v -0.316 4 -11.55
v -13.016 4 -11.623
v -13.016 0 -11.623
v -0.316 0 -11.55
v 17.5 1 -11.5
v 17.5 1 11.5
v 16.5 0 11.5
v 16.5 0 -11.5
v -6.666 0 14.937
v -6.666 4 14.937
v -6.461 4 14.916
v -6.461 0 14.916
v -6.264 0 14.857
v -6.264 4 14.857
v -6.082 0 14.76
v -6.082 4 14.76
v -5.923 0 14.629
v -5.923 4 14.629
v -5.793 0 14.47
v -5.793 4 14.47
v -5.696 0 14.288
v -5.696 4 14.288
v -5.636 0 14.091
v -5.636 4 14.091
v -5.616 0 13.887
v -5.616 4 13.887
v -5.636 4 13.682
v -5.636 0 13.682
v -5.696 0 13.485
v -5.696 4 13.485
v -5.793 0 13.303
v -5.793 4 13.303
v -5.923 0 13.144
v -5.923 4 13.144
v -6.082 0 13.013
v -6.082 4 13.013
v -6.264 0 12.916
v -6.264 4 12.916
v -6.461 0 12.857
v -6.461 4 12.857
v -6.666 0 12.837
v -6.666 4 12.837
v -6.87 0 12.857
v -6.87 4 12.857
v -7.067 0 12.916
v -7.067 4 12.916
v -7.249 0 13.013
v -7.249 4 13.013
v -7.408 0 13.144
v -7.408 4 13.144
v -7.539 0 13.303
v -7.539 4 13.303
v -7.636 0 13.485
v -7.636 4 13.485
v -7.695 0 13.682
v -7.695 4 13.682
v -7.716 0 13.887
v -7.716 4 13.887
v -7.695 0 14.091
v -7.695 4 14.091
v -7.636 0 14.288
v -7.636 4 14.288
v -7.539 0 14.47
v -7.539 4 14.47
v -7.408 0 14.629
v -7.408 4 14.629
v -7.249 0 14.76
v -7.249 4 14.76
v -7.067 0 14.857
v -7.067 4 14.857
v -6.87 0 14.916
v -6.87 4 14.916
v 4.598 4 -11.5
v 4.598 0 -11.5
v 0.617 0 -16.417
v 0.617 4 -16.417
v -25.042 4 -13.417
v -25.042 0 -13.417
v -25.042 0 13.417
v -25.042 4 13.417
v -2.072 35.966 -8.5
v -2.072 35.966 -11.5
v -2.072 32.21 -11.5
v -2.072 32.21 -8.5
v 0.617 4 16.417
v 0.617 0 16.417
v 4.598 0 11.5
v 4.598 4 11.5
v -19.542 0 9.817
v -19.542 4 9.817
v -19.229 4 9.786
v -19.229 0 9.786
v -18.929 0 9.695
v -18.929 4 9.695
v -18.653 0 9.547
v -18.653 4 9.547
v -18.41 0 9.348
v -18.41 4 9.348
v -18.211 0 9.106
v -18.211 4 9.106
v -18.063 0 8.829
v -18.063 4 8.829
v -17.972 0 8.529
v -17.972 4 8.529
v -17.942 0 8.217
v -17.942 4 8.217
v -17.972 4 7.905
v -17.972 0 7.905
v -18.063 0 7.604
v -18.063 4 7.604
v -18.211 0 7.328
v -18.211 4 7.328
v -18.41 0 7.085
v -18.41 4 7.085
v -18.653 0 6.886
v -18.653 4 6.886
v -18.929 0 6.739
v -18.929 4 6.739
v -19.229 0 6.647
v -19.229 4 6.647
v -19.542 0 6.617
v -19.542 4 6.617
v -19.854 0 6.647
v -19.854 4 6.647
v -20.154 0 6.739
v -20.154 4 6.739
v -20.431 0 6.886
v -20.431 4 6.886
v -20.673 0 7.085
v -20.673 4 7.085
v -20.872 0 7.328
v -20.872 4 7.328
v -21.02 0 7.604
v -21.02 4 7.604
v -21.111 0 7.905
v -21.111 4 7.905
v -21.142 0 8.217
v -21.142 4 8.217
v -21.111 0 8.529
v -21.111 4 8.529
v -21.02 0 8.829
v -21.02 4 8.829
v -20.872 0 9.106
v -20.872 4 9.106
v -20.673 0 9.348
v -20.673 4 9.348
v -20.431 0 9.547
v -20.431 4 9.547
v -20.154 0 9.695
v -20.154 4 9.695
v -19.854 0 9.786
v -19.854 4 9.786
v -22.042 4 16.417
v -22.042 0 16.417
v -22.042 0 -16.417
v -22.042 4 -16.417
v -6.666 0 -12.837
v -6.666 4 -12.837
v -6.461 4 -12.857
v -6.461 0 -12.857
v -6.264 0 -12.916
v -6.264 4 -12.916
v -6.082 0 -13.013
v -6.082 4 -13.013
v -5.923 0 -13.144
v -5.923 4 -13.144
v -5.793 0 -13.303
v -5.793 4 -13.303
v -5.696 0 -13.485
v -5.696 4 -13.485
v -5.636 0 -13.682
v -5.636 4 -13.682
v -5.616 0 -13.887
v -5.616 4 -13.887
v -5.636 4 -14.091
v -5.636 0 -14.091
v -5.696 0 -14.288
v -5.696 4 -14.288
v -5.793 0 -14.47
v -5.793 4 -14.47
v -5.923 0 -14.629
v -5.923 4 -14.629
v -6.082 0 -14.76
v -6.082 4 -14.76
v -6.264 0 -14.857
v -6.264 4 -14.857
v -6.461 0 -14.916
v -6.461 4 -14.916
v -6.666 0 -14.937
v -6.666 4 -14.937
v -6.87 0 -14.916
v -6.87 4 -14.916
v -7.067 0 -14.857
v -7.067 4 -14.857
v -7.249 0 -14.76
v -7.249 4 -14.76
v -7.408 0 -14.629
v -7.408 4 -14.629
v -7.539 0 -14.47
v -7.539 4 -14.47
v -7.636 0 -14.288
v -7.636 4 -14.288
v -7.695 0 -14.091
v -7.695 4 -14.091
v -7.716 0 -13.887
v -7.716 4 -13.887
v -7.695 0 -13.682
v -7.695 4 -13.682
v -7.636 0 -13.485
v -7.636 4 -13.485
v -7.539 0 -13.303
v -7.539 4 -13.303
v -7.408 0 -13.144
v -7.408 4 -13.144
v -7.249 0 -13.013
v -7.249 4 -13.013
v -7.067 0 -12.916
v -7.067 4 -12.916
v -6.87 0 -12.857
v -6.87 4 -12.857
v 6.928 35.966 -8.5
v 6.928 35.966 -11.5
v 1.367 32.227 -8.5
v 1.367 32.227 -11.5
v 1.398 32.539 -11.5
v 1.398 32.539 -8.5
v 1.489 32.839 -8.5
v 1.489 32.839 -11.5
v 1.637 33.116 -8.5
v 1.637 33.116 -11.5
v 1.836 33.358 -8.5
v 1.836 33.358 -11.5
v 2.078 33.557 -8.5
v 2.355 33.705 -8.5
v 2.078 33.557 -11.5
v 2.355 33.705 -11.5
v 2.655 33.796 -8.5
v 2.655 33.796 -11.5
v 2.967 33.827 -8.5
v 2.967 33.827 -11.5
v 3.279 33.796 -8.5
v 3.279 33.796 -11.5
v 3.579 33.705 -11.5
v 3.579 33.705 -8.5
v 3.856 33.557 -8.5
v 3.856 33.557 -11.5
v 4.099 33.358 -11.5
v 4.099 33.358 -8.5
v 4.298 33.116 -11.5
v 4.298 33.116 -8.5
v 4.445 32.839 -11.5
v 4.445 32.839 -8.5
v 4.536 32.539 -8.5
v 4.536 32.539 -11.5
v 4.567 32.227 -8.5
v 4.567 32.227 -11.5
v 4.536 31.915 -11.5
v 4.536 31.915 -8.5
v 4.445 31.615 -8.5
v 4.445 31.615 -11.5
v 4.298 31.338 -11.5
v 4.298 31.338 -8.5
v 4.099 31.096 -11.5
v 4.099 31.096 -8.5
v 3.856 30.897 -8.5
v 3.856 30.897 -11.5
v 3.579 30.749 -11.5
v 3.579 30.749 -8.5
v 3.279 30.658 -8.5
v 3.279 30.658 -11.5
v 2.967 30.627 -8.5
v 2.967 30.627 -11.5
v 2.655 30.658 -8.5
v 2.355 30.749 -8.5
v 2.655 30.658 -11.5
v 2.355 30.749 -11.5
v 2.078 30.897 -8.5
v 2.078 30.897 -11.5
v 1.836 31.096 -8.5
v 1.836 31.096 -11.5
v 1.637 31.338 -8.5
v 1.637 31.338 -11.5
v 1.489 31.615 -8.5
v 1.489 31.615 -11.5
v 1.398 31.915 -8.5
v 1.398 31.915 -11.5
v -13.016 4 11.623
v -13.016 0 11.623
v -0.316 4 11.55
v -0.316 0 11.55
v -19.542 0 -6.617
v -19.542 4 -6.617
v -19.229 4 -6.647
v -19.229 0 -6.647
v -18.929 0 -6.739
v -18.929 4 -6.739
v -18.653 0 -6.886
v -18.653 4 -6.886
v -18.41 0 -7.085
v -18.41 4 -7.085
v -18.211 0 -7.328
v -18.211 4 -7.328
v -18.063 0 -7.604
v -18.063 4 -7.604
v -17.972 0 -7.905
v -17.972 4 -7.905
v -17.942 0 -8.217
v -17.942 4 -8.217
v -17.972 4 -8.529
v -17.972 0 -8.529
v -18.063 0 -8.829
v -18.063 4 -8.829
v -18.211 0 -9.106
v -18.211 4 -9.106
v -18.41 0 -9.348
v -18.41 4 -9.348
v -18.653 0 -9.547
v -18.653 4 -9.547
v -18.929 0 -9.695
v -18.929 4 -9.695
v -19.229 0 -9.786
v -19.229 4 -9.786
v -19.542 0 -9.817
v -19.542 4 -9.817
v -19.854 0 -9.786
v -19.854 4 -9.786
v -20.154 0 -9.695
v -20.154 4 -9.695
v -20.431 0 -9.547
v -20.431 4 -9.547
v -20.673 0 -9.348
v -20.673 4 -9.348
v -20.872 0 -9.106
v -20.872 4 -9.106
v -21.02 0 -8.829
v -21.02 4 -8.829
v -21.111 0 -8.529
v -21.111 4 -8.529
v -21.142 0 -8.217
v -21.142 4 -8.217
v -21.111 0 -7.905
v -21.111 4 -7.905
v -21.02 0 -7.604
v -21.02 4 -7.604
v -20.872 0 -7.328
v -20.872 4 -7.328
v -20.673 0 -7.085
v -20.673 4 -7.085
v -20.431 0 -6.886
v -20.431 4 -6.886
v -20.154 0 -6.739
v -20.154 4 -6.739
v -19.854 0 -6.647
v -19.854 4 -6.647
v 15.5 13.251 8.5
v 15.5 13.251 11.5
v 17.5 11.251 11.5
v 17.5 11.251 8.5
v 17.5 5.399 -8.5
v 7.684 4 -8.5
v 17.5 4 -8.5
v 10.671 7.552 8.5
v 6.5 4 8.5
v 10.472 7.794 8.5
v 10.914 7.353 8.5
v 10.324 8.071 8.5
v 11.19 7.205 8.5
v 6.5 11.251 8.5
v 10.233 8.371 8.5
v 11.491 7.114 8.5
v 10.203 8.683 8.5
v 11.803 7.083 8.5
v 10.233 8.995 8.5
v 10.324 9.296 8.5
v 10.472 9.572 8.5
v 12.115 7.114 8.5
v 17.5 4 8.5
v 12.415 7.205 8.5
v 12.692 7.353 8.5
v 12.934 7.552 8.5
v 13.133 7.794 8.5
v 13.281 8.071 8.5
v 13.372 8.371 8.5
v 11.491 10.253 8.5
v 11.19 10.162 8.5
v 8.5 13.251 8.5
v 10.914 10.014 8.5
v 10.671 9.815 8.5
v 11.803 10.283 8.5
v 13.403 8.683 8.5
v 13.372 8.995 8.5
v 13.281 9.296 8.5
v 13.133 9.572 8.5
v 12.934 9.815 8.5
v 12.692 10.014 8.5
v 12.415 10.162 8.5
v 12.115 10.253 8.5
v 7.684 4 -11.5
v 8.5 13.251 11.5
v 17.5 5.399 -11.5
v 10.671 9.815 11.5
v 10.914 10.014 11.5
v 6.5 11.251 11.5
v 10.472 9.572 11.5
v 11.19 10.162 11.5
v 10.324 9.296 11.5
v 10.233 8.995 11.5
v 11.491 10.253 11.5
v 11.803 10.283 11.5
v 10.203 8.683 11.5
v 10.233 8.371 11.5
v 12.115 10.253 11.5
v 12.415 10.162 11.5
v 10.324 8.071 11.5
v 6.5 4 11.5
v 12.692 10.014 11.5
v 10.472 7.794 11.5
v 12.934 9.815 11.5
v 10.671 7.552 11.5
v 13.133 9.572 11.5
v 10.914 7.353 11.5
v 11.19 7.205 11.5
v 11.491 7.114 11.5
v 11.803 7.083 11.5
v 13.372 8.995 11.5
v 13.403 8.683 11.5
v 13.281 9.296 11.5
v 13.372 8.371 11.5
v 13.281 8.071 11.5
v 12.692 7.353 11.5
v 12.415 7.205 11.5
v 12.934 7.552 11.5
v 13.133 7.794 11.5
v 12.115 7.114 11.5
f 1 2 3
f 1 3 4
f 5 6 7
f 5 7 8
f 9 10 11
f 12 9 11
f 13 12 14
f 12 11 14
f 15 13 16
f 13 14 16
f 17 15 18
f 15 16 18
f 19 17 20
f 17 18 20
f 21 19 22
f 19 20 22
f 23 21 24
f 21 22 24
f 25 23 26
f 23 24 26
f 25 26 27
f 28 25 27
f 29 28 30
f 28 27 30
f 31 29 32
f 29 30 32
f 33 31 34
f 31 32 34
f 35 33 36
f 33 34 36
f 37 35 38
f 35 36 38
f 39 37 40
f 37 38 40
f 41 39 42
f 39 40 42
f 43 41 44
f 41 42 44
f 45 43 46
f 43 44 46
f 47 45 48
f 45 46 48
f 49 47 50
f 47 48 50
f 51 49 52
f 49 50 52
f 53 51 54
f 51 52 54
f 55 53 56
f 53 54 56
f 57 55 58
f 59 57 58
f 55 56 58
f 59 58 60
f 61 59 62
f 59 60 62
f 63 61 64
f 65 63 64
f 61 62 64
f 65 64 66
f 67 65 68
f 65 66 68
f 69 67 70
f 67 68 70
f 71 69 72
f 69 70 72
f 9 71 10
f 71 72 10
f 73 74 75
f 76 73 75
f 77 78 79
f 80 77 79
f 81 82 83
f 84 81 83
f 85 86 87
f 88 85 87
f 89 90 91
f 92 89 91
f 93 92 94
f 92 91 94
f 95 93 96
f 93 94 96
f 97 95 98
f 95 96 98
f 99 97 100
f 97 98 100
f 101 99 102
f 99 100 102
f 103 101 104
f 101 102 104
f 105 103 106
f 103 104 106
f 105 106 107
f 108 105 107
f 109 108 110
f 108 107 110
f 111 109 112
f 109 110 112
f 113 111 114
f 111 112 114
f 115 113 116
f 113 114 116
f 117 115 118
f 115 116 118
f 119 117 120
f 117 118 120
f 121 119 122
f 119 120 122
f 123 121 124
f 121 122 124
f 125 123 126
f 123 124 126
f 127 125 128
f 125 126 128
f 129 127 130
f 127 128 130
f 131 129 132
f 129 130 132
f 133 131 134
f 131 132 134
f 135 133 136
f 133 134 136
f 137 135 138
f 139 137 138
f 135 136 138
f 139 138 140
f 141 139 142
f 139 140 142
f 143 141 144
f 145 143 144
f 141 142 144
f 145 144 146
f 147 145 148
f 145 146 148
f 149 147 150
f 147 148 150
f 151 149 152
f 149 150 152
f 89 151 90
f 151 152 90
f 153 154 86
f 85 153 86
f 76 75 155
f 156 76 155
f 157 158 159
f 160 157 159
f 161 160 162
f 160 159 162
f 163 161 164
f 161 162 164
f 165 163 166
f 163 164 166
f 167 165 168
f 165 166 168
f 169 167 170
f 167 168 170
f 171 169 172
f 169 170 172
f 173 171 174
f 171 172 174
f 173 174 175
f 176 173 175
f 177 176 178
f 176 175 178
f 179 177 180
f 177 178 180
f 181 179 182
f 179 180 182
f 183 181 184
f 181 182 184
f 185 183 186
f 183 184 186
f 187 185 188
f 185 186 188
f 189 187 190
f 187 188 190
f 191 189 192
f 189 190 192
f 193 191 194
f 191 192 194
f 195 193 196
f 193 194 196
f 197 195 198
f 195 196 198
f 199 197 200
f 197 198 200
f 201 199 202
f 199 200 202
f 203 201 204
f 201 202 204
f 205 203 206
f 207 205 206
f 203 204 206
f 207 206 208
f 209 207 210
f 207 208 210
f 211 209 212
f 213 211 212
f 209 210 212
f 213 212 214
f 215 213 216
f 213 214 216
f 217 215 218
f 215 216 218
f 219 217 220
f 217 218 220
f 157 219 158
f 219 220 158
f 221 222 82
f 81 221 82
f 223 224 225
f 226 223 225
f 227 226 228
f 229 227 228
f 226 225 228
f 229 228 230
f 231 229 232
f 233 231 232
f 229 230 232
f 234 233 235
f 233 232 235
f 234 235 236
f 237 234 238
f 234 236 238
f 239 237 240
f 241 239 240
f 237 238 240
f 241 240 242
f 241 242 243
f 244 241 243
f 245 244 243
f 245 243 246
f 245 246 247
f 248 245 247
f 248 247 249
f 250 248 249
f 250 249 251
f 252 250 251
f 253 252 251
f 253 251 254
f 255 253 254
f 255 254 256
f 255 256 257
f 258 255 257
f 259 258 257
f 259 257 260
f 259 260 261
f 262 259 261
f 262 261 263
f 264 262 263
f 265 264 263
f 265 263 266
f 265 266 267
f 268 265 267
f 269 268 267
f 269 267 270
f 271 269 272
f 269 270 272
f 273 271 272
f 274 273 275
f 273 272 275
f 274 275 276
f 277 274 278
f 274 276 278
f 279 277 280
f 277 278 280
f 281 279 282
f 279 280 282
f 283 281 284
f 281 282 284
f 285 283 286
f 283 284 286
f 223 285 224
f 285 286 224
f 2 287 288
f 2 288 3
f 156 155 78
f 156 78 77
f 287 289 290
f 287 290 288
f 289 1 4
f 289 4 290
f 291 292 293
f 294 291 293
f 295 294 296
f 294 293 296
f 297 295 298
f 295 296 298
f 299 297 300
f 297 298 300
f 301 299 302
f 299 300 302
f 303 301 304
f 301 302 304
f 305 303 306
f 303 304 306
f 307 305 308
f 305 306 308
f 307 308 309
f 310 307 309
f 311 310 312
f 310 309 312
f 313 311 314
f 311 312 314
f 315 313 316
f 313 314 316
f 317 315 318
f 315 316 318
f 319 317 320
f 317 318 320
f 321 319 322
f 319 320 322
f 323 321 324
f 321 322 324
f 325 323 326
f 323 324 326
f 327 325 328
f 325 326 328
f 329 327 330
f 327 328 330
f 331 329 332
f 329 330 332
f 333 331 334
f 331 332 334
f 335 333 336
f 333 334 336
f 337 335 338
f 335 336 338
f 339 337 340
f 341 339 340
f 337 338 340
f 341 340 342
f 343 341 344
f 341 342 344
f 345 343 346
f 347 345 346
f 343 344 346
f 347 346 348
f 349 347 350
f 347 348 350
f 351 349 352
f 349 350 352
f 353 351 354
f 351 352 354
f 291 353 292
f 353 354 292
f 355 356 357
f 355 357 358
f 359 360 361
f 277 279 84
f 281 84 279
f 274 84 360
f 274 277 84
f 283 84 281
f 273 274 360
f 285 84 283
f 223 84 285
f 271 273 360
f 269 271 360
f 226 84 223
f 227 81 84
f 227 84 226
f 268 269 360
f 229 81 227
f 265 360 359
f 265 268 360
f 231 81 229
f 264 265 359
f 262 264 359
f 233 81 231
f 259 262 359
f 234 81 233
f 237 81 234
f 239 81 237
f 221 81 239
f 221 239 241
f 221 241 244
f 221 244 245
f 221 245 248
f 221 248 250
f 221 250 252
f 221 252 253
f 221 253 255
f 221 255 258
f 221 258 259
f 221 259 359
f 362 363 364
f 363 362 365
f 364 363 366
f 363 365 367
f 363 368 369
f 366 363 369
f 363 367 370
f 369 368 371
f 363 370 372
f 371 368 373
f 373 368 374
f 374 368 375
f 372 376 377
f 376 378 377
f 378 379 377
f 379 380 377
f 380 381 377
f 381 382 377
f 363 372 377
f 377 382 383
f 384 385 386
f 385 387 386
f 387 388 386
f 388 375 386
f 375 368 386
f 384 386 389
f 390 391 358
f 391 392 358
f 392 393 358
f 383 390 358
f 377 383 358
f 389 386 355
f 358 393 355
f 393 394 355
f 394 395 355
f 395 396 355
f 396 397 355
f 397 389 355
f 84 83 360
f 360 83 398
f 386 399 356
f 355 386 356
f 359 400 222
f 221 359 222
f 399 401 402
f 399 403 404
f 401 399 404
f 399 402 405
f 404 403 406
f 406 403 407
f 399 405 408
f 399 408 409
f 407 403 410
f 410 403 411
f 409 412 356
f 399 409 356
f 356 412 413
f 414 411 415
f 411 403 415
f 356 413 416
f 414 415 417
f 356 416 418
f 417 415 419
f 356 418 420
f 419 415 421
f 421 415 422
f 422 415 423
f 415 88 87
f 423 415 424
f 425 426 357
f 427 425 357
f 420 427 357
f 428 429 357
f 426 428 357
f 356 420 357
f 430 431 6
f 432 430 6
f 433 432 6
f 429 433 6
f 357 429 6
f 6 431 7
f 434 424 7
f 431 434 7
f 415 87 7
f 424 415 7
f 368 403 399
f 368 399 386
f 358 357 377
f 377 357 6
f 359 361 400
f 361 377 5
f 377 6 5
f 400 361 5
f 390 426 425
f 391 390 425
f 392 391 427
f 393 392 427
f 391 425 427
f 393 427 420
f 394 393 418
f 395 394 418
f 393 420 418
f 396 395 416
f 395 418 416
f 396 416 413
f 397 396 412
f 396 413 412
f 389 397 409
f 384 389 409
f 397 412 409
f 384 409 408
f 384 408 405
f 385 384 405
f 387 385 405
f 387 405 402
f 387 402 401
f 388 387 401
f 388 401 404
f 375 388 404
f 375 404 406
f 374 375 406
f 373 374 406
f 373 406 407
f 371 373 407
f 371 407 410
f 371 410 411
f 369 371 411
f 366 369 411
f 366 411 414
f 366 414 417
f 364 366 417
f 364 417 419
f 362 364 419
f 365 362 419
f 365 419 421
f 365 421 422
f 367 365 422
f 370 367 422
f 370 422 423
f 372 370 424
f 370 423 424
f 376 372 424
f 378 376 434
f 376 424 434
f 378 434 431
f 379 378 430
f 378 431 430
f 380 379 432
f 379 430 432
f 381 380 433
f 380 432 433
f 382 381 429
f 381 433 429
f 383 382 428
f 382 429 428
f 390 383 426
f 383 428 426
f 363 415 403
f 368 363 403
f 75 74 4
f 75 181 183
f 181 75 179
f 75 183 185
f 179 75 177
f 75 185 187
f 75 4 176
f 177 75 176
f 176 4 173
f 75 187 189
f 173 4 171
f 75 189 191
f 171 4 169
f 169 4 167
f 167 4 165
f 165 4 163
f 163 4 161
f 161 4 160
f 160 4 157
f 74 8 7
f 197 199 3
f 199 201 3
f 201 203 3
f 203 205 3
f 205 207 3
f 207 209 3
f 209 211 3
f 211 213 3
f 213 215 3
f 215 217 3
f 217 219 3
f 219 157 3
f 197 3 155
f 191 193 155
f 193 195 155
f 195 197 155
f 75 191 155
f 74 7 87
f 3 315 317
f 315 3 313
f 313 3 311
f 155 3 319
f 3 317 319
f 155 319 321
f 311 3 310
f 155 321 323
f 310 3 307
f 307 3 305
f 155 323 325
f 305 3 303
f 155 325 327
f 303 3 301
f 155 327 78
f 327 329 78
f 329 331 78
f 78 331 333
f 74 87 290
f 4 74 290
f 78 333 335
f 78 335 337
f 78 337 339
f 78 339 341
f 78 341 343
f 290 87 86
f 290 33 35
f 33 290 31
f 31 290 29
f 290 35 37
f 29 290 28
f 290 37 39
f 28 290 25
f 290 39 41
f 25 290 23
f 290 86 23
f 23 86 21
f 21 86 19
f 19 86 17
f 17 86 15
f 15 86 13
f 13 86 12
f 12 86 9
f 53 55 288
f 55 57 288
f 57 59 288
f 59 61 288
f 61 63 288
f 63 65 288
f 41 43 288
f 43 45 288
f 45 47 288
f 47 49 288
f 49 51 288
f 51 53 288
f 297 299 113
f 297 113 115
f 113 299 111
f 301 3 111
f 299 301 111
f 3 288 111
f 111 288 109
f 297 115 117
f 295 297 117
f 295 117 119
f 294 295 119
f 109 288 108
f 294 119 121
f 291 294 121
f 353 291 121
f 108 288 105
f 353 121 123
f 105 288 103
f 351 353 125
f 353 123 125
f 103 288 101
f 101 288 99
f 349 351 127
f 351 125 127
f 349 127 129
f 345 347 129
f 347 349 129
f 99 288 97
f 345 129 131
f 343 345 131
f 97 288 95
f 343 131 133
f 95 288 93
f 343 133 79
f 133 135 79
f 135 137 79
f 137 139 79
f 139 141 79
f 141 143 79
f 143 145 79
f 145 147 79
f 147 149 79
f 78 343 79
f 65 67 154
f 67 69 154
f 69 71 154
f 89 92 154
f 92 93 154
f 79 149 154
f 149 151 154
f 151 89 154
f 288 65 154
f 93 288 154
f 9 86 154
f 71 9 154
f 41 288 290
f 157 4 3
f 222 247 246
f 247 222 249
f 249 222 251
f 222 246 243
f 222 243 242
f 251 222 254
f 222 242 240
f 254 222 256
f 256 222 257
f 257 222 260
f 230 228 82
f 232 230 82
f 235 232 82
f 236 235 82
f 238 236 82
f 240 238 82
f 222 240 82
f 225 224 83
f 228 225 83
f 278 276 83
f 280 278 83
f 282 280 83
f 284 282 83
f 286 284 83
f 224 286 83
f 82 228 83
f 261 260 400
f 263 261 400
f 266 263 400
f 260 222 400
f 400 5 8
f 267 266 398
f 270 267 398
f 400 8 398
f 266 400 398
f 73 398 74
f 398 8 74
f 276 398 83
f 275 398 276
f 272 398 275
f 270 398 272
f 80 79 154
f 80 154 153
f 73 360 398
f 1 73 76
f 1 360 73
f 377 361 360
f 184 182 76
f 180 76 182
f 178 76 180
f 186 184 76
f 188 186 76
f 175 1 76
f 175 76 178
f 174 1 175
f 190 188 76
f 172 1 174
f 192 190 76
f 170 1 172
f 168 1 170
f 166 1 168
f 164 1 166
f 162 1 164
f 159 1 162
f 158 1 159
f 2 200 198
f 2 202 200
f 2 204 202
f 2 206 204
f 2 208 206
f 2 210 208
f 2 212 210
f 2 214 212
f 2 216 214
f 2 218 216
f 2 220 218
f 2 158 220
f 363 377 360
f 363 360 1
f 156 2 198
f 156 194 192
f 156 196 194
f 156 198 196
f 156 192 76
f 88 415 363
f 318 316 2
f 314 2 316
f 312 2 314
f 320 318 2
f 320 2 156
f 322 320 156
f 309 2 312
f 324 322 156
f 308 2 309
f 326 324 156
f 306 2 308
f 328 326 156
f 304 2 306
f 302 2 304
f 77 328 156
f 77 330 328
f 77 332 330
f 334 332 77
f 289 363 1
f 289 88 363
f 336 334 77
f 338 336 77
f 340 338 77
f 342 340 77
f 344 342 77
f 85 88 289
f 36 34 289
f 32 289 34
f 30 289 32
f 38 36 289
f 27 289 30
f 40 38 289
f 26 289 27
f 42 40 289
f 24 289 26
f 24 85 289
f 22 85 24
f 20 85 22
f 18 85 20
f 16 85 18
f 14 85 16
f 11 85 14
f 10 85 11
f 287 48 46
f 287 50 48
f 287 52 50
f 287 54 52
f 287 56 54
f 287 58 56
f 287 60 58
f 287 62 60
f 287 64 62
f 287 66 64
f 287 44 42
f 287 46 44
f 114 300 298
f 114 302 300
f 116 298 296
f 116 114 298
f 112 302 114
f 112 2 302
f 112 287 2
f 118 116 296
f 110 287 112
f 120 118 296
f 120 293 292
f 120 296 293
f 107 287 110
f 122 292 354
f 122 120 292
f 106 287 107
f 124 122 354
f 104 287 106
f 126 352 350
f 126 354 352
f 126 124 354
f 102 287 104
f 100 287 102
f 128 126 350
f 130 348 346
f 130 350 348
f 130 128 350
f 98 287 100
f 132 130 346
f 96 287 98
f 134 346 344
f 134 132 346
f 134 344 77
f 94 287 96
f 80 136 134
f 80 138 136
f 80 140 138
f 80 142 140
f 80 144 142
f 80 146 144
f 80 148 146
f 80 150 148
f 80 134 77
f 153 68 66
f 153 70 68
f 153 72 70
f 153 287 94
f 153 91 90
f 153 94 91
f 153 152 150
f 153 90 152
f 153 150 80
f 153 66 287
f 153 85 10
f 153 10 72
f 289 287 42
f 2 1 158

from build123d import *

# Parameters (mm, degrees)
BOSS_EXTRU_1_DEPTH      = 4
ESQUISSE4_W             = 11
ESQUISSE4_H             = 11
BOSS_EXTRU_2_DEPTH      = 3
BOSS_EXTRU_3_DEPTH      = 3
ESQUISSE6_R             = 1.6
ENL_V_MAT_EXTRU_1_DEPTH = 10
ESQUISSE7_R             = 1.6
ENL_V_MAT_EXTRU_2_DEPTH = 10
BOSS_EXTRU_4_DEPTH      = 4
ESQUISSE10_R            = 1.05
ESQUISSE10_R_2          = 1.6
ENL_V_MAT_EXTRU_3_DEPTH = 4
CHANFREIN1_SIZE         = 1
CHANFREIN2_SIZE         = 3
CHANFREIN3_SIZE         = 2


with BuildPart() as part:
    # Esquisse2 → Boss.-Extru.1 (new body)
    with BuildSketch(Plane(origin=(0, 0, 0), x_dir=(1, 0, 0), z_dir=(0, 1, 0))):
        Polygon((17.5, 0), (17.5, 11.5), (-17.5, 11.5), (-17.5, 0), (-17.5, -11.5), (17.5, -11.5), align=None)
    extrude(amount=BOSS_EXTRU_1_DEPTH)

    # Esquisse4 → Boss.-Extru.2 (add)
    with BuildSketch(Plane.XY.offset(11.5)):
        with Locations((12, 7.750794337)):
            Rectangle(ESQUISSE4_W, ESQUISSE4_H)
    extrude(amount=-BOSS_EXTRU_2_DEPTH)

    # Esquisse5 → Boss.-Extru.3 (add)
    with BuildSketch(Plane(origin=(0, 0, -11.5), x_dir=(-1, 0, 0), z_dir=(0, 0, -1))):
        Polygon((-17.5, 2.494257601), (-17.5, 5.399089221), (-6.928293138, 35.966080358), (2.072303922, 35.966080358), (2.072303922, 32.210427233), (-7.684376604, 4), (-7.684376604, 2.494257601), align=None)
    extrude(amount=-BOSS_EXTRU_3_DEPTH)

    # Esquisse6 → Enlèv. mat.-Extru.1 (cut)
    with BuildSketch(Plane.XY.offset(11.5)):
        with Locations((11.802703711, 8.683300858)):
            Circle(ESQUISSE6_R)
    extrude(amount=-ENL_V_MAT_EXTRU_1_DEPTH, mode=Mode.SUBTRACT)

    # Esquisse7 → Enlèv. mat.-Extru.2 (cut)
    with BuildSketch(Plane(origin=(0, 0, -11.5), x_dir=(-1, 0, 0), z_dir=(0, 0, -1))):
        with Locations((-2.967152129, 32.227121405)):
            Circle(ESQUISSE7_R)
    extrude(amount=-ENL_V_MAT_EXTRU_2_DEPTH, mode=Mode.SUBTRACT)

    # Esquisse8 → Boss.-Extru.4 (add)
    with BuildSketch(Plane.XZ):
        Polygon((4.598369828, -11.5), (0.61743287, -16.416755672), (-25.041628639, -16.416755672), (-25.041628639, 16.416755672), (0.61743287, 16.416755672), (4.598369828, 11.5), align=None)
    extrude(amount=-BOSS_EXTRU_4_DEPTH)

    # Esquisse10 → Enlèv. mat.-Extru.3 (cut)
    with BuildSketch(Plane(origin=(0, 4, 0), x_dir=(1, 0, 0), z_dir=(0, 1, 0))):
        with Locations(Location((-6.665623396, -13.88650623, 0), (0, 0, 270))):
            Circle(ESQUISSE10_R)
        with Locations(Location((-6.665623396, 13.88650623, 0), (0, 0, 270))):
            Circle(ESQUISSE10_R)
        with Locations(Location((-19.541628639, 8.216755672, 0), (0, 0, 270))):
            Circle(ESQUISSE10_R_2)
        with Locations(Location((-19.541628639, -8.216755672, 0), (0, 0, 270))):
            Circle(ESQUISSE10_R_2)
        Polygon((-13.015623396, -11.622936602), (-13.015623396, 11.622936602), (-0.315623396, 11.55), (-0.315623396, -11.55), align=None)
    extrude(amount=-ENL_V_MAT_EXTRU_3_DEPTH, mode=Mode.SUBTRACT)

    # Chanfrein1
    chanfrein1_edges = [part.edges().sort_by_distance(p)[0] for p in [
        (17.5, 0, 0),
    ]]
    chamfer(chanfrein1_edges, length=CHANFREIN1_SIZE)

    # Chanfrein2
    chanfrein2_edges = [part.edges().sort_by_distance(p)[0] for p in [
        (-25.041628639, 2, -16.416755672),
        (-25.041628639, 2, 16.416755672),
    ]]
    chamfer(chanfrein2_edges, length=CHANFREIN2_SIZE)

    # Chanfrein3
    chanfrein3_edges = [part.edges().sort_by_distance(p)[0] for p in [
        (6.5, 13.250794337, 10),
        (17.5, 13.250794337, 10),
    ]]
    chamfer(chanfrein3_edges, length=CHANFREIN3_SIZE)


solid = part.part
